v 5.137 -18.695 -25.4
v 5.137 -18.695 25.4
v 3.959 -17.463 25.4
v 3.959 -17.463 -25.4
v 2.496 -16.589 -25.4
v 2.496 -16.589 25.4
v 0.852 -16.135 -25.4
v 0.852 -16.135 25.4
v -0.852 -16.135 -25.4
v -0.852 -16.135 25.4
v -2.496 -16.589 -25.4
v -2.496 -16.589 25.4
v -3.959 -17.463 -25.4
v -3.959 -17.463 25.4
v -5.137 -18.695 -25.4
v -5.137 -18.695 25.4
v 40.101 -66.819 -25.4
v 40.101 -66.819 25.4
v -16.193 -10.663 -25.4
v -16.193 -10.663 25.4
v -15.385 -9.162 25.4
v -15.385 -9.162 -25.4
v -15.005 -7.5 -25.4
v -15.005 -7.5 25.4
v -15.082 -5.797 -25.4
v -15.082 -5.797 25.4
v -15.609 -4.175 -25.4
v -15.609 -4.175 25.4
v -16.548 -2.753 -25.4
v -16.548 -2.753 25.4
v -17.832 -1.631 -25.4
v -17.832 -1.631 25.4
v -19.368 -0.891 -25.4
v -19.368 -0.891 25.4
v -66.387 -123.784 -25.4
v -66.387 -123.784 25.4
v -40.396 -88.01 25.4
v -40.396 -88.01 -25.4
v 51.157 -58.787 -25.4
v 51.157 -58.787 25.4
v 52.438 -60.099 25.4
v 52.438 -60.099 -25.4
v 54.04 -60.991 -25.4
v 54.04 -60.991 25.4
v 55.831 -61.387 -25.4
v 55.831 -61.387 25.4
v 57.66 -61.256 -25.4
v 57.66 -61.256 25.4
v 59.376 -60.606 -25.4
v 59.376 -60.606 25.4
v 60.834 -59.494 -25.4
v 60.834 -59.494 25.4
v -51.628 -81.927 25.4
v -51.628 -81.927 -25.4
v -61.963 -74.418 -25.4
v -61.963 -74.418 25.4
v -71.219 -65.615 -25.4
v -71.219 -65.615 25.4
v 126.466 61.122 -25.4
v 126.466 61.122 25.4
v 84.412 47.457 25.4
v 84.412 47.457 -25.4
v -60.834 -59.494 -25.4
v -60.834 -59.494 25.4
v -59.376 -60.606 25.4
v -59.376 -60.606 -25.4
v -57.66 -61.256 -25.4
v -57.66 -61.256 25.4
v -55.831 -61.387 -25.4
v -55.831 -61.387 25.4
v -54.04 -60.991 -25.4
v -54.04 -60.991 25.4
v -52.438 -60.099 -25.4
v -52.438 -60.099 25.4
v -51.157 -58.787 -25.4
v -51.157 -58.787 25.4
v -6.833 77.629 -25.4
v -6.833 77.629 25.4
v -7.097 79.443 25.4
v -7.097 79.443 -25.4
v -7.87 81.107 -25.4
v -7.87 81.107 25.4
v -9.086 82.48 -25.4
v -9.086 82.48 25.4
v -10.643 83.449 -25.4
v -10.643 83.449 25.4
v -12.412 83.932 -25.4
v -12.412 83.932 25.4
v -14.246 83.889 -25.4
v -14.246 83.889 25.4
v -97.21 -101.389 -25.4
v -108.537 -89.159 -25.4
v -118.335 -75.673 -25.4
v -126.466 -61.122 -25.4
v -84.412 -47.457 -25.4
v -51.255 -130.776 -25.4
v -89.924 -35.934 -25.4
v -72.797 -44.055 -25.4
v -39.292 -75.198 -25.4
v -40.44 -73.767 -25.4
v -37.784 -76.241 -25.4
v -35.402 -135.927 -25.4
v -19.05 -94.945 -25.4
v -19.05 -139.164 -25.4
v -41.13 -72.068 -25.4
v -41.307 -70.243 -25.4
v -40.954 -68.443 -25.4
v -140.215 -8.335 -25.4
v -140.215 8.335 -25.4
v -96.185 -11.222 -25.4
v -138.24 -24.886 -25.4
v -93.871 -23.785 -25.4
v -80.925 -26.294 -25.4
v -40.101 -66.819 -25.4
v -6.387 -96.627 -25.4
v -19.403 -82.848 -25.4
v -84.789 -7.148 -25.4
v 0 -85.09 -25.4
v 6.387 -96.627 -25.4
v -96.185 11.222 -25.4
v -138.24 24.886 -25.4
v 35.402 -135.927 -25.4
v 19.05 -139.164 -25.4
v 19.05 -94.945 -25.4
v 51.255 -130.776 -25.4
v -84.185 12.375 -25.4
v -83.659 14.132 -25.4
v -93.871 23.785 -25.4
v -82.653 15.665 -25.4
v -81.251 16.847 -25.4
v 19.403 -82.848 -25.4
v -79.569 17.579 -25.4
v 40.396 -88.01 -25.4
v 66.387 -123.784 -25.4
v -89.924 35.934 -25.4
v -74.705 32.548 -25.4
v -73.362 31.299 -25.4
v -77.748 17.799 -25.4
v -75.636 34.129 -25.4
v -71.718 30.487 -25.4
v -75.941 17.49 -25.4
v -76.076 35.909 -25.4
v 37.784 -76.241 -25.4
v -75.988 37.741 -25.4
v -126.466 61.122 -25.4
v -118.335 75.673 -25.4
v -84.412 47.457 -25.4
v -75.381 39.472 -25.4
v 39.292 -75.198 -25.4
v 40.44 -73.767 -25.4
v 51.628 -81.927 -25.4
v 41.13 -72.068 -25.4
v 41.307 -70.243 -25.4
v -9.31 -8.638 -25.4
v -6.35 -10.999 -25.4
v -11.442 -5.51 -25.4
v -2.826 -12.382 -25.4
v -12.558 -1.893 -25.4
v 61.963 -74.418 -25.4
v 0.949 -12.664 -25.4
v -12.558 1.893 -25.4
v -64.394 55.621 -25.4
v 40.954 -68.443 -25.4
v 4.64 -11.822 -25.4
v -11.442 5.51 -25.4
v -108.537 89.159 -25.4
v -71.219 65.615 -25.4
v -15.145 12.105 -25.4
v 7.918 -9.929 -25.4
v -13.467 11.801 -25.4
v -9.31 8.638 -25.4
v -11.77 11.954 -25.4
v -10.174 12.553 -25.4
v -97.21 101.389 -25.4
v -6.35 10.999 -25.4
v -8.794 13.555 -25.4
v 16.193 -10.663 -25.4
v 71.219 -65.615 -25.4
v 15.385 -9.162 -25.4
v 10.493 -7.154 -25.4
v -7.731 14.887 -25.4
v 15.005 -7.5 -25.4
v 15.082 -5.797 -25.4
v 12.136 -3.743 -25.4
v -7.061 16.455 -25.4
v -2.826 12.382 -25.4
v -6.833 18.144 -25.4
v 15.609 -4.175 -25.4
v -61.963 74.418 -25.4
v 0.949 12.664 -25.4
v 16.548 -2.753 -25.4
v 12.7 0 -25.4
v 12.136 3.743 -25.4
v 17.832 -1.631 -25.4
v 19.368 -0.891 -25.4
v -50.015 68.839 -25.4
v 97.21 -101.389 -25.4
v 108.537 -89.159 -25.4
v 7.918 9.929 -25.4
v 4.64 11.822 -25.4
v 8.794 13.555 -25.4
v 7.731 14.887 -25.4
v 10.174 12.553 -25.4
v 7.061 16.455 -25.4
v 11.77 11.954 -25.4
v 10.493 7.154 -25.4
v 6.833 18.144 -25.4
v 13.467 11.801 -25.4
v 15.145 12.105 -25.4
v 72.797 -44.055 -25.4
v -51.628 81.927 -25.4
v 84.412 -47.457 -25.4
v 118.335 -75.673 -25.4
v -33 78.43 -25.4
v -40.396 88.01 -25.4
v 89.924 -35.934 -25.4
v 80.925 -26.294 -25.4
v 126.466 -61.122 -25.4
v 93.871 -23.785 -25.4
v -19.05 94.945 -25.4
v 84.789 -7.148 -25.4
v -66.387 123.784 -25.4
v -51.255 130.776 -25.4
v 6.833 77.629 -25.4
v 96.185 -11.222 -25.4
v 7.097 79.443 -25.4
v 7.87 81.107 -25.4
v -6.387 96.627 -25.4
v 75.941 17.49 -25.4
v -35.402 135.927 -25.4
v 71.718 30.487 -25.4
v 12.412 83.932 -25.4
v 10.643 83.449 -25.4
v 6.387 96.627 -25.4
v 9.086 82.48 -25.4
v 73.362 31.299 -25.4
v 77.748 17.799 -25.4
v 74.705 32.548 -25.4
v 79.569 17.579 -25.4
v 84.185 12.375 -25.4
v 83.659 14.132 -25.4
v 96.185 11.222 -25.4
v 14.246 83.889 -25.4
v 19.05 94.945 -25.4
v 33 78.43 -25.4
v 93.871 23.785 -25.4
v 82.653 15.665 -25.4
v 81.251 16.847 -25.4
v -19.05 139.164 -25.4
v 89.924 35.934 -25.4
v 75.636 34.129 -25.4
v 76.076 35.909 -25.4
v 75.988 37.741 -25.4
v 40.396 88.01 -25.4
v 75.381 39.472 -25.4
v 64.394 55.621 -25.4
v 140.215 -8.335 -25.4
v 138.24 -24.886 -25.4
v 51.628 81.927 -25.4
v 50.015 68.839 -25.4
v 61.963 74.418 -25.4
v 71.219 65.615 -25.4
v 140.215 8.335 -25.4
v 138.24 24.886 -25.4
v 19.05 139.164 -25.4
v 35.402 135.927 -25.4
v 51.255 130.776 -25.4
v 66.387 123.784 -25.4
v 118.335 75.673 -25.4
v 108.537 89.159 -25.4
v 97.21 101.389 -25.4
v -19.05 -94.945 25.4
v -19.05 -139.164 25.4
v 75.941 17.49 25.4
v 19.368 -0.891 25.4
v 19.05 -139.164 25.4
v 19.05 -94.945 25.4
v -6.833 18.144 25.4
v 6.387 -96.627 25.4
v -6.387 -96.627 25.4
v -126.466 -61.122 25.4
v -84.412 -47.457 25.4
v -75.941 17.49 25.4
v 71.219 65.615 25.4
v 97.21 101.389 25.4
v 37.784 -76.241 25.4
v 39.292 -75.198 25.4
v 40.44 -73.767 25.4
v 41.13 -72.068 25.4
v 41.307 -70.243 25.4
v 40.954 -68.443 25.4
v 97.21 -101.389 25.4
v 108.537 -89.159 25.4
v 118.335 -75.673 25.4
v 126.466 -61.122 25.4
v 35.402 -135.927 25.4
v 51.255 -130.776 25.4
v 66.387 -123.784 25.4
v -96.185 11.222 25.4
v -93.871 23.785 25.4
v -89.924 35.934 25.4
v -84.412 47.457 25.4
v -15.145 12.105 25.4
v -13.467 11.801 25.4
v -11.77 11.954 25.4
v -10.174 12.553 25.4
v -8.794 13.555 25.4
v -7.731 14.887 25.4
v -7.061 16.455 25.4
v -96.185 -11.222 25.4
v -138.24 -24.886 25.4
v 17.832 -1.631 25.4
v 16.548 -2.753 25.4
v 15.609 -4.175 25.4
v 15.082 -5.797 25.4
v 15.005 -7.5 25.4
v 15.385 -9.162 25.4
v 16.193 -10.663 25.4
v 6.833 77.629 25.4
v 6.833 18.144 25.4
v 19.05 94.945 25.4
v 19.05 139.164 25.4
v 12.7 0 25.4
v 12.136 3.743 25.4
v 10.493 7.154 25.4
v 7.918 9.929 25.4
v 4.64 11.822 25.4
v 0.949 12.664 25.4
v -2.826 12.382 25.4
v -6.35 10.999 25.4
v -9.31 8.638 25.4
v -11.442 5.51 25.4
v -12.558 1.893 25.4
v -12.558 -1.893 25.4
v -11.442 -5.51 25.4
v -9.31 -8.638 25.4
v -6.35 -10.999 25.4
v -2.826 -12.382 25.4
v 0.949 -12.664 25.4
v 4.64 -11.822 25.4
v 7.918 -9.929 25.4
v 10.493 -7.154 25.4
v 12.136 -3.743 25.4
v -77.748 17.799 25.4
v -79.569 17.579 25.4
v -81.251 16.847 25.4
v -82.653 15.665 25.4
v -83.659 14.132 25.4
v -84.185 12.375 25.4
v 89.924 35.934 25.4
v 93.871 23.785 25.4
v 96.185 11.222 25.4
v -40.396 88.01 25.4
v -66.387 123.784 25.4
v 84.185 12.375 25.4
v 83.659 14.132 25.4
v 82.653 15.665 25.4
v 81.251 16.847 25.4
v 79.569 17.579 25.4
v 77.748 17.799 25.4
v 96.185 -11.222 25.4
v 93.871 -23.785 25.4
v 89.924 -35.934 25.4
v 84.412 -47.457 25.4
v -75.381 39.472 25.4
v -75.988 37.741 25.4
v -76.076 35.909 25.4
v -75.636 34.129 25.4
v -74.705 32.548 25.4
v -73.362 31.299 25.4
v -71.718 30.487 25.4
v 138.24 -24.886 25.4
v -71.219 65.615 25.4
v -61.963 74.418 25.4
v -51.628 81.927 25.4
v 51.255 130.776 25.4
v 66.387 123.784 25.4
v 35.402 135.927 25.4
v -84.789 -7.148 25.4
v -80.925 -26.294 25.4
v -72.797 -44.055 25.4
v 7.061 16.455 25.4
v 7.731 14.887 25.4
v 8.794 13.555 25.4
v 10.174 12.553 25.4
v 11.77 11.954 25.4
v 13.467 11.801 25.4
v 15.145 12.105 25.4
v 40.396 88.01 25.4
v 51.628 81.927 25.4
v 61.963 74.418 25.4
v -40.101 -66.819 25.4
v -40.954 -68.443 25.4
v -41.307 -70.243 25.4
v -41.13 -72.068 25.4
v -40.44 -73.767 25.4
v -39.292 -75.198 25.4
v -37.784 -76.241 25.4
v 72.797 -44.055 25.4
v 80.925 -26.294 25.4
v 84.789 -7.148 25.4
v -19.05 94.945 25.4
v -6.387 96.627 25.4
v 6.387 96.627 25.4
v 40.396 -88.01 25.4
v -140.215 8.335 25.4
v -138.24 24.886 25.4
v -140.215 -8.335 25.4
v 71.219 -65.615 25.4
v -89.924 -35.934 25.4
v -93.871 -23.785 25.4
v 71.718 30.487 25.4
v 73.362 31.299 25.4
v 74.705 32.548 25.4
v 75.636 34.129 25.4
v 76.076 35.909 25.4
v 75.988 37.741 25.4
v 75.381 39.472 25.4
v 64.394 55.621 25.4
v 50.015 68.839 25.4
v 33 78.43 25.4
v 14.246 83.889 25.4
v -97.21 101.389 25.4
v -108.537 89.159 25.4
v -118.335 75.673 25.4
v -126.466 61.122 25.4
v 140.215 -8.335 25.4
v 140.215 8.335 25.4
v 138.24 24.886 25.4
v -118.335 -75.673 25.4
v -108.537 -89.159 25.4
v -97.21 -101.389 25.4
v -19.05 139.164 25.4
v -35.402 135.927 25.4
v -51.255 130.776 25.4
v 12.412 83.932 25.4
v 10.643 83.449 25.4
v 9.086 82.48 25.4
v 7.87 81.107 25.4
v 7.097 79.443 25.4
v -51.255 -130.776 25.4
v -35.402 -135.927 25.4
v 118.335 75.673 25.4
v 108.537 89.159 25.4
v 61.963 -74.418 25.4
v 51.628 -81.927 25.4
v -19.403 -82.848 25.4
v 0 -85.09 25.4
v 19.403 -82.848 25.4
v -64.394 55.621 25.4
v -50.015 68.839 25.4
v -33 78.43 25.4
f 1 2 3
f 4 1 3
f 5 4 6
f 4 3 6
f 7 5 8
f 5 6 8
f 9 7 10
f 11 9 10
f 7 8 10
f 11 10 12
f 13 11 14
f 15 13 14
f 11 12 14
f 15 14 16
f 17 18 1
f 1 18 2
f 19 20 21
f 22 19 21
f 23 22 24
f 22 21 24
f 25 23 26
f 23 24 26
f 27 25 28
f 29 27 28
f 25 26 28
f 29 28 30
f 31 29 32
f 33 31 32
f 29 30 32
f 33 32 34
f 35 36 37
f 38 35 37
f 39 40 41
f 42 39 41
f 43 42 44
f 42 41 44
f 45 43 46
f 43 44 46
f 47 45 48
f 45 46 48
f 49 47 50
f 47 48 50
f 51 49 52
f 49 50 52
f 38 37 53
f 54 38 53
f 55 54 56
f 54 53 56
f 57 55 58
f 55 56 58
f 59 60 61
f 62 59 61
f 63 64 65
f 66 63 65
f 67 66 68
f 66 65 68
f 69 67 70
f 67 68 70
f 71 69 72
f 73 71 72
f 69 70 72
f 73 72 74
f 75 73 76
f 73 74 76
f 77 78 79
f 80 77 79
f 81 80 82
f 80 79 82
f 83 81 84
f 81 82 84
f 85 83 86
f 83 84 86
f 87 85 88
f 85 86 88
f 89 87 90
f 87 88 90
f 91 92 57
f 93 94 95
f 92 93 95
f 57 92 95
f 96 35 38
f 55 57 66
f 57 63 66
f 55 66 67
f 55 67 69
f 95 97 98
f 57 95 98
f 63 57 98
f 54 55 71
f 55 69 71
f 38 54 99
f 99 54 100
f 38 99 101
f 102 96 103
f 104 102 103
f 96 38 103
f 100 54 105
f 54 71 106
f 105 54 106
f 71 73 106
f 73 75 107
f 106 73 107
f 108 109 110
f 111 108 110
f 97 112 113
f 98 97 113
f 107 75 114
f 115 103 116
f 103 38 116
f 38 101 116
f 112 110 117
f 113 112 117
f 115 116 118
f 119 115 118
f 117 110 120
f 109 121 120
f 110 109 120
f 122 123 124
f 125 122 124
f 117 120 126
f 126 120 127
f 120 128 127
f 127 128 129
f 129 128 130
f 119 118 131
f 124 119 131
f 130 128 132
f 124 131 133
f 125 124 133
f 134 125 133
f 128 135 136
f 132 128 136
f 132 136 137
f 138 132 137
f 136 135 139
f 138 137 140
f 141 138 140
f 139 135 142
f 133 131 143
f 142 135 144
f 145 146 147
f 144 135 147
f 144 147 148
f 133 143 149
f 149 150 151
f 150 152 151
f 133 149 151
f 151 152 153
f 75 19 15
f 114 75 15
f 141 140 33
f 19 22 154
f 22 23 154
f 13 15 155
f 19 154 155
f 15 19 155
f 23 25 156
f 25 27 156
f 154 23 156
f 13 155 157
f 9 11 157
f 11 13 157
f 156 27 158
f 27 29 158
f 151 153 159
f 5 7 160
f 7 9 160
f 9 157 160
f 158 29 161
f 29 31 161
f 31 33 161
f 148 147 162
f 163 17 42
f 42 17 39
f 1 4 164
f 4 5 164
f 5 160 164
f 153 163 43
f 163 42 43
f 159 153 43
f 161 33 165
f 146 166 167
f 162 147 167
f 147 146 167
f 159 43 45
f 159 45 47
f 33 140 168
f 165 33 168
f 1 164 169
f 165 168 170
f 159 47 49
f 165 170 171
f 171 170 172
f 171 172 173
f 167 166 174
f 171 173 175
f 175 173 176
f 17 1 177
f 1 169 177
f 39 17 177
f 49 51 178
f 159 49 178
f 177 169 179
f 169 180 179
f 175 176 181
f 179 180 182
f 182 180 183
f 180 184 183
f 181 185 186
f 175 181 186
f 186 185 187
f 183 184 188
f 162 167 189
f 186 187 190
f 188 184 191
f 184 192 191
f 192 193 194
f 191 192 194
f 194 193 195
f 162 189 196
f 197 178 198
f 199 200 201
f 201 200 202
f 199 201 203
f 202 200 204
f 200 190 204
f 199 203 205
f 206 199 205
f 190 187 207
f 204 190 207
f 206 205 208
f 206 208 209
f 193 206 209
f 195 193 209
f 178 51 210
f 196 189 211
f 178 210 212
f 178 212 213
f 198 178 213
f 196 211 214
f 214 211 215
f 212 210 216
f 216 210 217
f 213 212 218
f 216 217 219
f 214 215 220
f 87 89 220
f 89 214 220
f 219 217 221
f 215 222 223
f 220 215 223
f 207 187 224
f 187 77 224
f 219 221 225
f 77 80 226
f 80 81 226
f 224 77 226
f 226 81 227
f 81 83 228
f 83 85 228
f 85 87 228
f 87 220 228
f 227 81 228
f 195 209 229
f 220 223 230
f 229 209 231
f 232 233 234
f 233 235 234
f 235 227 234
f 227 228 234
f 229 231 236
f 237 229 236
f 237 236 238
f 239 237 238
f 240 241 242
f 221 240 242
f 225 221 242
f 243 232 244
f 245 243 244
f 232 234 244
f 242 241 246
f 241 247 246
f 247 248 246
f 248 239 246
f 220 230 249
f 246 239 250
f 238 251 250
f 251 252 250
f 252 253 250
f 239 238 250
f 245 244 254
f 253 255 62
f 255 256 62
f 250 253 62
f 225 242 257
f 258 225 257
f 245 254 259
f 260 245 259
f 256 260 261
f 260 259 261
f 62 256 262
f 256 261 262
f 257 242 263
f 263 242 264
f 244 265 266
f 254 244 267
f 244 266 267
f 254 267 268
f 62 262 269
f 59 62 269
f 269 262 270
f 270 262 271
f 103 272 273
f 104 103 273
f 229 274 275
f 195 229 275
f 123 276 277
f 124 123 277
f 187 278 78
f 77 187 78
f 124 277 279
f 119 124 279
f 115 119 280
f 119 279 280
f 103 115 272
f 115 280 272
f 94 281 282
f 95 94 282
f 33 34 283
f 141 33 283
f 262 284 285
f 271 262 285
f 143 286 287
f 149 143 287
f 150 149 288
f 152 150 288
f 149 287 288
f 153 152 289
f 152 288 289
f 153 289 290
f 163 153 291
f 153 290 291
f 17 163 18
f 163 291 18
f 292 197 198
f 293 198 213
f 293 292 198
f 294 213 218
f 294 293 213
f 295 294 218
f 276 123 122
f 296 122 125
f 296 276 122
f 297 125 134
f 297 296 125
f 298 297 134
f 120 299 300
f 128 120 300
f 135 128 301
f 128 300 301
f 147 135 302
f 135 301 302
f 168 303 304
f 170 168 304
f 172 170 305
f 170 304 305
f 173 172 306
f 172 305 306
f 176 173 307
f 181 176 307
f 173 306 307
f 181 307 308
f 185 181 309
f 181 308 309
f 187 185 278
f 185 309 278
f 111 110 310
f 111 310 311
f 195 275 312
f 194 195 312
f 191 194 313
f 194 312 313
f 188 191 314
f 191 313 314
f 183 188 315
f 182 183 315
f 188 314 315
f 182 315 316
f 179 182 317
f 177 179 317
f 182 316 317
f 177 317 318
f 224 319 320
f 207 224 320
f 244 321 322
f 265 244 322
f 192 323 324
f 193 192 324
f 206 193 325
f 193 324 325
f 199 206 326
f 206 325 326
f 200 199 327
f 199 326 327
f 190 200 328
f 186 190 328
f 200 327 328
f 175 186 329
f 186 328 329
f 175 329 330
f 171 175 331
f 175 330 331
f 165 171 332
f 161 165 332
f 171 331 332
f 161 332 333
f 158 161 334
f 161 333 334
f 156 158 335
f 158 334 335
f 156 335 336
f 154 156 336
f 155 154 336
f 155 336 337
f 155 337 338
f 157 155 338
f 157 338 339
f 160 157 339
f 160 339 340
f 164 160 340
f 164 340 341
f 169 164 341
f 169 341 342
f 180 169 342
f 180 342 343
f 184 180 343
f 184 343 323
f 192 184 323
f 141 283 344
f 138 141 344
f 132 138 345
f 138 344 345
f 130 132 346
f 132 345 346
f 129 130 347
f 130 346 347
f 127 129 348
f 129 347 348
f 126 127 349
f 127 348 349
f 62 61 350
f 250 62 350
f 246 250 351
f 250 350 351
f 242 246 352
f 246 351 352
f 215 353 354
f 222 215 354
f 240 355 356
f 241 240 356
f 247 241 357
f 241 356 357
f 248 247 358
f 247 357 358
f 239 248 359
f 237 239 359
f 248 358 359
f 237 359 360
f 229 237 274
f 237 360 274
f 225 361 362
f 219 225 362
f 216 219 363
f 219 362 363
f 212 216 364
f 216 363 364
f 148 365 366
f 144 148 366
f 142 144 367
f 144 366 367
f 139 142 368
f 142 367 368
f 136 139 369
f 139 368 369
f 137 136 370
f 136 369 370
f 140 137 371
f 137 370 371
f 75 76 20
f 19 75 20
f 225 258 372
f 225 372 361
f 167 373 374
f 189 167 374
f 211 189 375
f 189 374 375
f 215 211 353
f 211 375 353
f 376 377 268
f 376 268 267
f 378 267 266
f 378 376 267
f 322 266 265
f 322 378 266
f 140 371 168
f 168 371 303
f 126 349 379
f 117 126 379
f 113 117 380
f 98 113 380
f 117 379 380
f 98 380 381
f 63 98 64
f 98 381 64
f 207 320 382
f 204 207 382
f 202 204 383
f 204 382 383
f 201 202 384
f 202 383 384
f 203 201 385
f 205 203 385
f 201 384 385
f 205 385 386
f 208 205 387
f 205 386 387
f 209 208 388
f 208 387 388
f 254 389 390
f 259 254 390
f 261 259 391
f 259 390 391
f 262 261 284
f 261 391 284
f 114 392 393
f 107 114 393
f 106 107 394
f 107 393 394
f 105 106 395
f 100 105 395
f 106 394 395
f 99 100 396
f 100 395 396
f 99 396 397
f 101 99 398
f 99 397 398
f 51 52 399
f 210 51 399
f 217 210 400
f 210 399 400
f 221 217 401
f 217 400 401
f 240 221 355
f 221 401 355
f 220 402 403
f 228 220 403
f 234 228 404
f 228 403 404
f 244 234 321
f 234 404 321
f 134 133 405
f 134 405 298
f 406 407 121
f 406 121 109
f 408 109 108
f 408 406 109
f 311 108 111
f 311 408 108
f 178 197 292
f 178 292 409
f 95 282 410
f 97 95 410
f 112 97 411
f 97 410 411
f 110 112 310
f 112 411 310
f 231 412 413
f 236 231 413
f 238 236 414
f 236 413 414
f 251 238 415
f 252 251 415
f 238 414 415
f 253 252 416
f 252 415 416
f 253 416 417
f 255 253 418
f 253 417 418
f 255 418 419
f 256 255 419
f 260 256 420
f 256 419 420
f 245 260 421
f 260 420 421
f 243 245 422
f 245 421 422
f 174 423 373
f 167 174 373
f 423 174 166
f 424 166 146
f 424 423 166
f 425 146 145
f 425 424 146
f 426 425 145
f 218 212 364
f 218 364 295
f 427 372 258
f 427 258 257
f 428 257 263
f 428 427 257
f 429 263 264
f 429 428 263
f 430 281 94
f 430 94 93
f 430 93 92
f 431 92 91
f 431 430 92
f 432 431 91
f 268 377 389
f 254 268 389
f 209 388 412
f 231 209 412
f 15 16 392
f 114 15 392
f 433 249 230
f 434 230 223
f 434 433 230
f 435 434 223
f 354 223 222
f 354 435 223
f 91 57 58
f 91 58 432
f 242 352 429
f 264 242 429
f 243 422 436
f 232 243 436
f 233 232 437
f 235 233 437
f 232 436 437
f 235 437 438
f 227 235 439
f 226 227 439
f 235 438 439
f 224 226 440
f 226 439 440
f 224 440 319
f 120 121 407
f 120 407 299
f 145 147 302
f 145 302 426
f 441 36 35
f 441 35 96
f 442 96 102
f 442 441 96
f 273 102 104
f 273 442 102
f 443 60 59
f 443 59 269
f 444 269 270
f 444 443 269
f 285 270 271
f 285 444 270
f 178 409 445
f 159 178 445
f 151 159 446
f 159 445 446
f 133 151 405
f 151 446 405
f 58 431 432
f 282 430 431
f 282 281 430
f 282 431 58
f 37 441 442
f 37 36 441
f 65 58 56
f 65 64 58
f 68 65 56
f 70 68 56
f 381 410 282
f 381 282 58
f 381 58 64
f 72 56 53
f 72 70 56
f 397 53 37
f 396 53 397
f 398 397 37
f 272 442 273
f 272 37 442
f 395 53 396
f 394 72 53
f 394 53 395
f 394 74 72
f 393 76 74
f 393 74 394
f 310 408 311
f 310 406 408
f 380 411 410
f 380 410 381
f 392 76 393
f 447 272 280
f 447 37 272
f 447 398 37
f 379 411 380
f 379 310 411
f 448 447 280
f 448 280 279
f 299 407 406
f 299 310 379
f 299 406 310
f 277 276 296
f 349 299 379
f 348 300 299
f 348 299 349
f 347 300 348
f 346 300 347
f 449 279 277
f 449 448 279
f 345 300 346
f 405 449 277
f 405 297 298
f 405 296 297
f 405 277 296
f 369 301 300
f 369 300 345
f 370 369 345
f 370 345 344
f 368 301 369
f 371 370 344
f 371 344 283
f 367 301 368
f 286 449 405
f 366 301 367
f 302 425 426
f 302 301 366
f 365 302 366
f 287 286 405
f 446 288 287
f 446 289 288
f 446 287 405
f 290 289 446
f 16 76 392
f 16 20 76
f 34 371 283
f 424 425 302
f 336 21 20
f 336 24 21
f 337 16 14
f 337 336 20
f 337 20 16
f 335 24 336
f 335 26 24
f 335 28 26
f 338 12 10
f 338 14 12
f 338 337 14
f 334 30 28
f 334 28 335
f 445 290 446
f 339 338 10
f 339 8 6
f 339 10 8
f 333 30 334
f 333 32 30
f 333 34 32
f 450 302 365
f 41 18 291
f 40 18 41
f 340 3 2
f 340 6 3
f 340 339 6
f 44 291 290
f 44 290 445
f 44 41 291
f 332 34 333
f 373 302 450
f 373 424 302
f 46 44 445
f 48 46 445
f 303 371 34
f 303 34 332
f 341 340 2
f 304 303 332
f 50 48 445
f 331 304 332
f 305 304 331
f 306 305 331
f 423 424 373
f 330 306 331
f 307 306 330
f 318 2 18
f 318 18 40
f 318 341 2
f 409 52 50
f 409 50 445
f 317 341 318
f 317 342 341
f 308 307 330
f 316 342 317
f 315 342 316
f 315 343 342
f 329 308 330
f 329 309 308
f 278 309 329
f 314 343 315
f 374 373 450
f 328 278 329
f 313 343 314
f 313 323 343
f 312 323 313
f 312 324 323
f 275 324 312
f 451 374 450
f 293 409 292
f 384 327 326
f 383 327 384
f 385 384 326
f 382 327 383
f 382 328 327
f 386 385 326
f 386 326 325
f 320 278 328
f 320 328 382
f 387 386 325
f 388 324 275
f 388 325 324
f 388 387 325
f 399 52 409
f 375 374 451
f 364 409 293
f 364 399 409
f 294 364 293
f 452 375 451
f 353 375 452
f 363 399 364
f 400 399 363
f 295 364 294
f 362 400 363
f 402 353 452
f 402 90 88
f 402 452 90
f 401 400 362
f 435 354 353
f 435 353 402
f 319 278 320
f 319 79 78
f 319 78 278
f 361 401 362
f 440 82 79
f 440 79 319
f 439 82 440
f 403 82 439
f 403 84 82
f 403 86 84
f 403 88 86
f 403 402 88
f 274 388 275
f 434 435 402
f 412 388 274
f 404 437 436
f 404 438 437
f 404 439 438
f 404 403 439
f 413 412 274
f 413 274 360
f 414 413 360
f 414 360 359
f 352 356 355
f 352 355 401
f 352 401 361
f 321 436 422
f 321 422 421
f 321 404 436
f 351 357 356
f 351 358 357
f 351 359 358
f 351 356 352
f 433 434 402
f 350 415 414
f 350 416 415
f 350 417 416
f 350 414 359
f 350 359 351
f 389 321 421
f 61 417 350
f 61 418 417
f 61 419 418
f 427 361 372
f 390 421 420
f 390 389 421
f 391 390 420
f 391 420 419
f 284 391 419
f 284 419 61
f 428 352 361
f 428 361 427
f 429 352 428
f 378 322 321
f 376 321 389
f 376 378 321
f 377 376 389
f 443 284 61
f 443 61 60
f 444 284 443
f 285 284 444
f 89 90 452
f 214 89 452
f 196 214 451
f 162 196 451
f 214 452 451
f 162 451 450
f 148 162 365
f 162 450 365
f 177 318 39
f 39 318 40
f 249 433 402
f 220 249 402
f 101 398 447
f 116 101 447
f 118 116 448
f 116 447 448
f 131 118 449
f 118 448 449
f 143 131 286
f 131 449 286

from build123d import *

# Parameters (mm, degrees)
F0_R            = 140.462
F1_DEPTH        = 25.4
F3_DEPTH        = 50.801
F3_COPIES_COUNT = 10
F6_DEPTH        = 50.801
F6_COPIES_COUNT = 5
F7_R            = 12.7
F8_DEPTH        = 50.801


# Not quite as in the source:
# - a pattern or mirror of a feature is missing from the dataset's text; its kind, count and spacing are read off the source's solid


with BuildPart() as f1:
    # F0 (on Top) → F1 (new body, symmetric)
    with BuildSketch(Plane.XY):
        Circle(F0_R)
    extrude(amount=F1_DEPTH, both=True)

    # F2 (on face) → F3 (cut, through all)
    with BuildSketch(Plane.XY.offset(25.4)):
        with BuildLine():
            ThreePointArc((-19.05, 94.9452416198), (0, 96.8375), (19.05, 94.9452416198))
            Line((19.05, 94.9452416198), (19.05, 139.1641870023))
            ThreePointArc((19.05, 139.1641870023), (0, 140.462), (-19.05, 139.1641870023))
            Line((-19.05, 139.1641870023), (-19.05, 94.9452416198))
        make_face()
    f3 = extrude(amount=-F3_DEPTH, mode=Mode.SUBTRACT)

    # F3_copies: F3 ×10 about axis
    f3_copies_axis = Axis((0, 0, 0), (0, 0, 1))
    for i in range(1, F3_COPIES_COUNT):
        add(f3.rotate(f3_copies_axis, i * 360 / F3_COPIES_COUNT), mode=Mode.SUBTRACT)

    # F5 (on face) → F6 (cut, through all)
    with BuildSketch(Plane.XY.offset(25.4)):
        with BuildLine():
            ThreePointArc((71.7178399755, 30.4867595727), (75.6356515828, 34.1286194106), (75.3810322275, 39.4716110682))
            ThreePointArc((75.3810322275, 39.4716110682), (50.0146471176, 68.8392560514), (14.2457129032, 83.8890205204))
            ThreePointArc((14.2457129032, 83.8890205204), (9.0855441629, 82.4801026945), (6.8326, 77.6286458547))
            Line((6.8326, 77.6286458547), (6.8326, 18.1442923048))
            ThreePointArc((6.8326, 18.1442923048), (9.4501636479, 13.0070343905), (15.1448579143, 12.1050834263))
            Line((15.1448579143, 12.1050834263), (71.7178399755, 30.4867595727))
        make_face()
    f6 = extrude(amount=-F6_DEPTH, mode=Mode.SUBTRACT)

    # F6_copies: F6 ×5 about axis
    f6_copies_axis = Axis((0, 0, 0), (0, 0, 1))
    for i in range(1, F6_COPIES_COUNT):
        add(f6.rotate(f6_copies_axis, i * 360 / F6_COPIES_COUNT), mode=Mode.SUBTRACT)

    # F7 (on face) → F8 (cut, through all)
    with BuildSketch(Plane.XY.offset(25.4)):
        Circle(F7_R)
    extrude(amount=-F8_DEPTH, mode=Mode.SUBTRACT)


solid = f1.part
